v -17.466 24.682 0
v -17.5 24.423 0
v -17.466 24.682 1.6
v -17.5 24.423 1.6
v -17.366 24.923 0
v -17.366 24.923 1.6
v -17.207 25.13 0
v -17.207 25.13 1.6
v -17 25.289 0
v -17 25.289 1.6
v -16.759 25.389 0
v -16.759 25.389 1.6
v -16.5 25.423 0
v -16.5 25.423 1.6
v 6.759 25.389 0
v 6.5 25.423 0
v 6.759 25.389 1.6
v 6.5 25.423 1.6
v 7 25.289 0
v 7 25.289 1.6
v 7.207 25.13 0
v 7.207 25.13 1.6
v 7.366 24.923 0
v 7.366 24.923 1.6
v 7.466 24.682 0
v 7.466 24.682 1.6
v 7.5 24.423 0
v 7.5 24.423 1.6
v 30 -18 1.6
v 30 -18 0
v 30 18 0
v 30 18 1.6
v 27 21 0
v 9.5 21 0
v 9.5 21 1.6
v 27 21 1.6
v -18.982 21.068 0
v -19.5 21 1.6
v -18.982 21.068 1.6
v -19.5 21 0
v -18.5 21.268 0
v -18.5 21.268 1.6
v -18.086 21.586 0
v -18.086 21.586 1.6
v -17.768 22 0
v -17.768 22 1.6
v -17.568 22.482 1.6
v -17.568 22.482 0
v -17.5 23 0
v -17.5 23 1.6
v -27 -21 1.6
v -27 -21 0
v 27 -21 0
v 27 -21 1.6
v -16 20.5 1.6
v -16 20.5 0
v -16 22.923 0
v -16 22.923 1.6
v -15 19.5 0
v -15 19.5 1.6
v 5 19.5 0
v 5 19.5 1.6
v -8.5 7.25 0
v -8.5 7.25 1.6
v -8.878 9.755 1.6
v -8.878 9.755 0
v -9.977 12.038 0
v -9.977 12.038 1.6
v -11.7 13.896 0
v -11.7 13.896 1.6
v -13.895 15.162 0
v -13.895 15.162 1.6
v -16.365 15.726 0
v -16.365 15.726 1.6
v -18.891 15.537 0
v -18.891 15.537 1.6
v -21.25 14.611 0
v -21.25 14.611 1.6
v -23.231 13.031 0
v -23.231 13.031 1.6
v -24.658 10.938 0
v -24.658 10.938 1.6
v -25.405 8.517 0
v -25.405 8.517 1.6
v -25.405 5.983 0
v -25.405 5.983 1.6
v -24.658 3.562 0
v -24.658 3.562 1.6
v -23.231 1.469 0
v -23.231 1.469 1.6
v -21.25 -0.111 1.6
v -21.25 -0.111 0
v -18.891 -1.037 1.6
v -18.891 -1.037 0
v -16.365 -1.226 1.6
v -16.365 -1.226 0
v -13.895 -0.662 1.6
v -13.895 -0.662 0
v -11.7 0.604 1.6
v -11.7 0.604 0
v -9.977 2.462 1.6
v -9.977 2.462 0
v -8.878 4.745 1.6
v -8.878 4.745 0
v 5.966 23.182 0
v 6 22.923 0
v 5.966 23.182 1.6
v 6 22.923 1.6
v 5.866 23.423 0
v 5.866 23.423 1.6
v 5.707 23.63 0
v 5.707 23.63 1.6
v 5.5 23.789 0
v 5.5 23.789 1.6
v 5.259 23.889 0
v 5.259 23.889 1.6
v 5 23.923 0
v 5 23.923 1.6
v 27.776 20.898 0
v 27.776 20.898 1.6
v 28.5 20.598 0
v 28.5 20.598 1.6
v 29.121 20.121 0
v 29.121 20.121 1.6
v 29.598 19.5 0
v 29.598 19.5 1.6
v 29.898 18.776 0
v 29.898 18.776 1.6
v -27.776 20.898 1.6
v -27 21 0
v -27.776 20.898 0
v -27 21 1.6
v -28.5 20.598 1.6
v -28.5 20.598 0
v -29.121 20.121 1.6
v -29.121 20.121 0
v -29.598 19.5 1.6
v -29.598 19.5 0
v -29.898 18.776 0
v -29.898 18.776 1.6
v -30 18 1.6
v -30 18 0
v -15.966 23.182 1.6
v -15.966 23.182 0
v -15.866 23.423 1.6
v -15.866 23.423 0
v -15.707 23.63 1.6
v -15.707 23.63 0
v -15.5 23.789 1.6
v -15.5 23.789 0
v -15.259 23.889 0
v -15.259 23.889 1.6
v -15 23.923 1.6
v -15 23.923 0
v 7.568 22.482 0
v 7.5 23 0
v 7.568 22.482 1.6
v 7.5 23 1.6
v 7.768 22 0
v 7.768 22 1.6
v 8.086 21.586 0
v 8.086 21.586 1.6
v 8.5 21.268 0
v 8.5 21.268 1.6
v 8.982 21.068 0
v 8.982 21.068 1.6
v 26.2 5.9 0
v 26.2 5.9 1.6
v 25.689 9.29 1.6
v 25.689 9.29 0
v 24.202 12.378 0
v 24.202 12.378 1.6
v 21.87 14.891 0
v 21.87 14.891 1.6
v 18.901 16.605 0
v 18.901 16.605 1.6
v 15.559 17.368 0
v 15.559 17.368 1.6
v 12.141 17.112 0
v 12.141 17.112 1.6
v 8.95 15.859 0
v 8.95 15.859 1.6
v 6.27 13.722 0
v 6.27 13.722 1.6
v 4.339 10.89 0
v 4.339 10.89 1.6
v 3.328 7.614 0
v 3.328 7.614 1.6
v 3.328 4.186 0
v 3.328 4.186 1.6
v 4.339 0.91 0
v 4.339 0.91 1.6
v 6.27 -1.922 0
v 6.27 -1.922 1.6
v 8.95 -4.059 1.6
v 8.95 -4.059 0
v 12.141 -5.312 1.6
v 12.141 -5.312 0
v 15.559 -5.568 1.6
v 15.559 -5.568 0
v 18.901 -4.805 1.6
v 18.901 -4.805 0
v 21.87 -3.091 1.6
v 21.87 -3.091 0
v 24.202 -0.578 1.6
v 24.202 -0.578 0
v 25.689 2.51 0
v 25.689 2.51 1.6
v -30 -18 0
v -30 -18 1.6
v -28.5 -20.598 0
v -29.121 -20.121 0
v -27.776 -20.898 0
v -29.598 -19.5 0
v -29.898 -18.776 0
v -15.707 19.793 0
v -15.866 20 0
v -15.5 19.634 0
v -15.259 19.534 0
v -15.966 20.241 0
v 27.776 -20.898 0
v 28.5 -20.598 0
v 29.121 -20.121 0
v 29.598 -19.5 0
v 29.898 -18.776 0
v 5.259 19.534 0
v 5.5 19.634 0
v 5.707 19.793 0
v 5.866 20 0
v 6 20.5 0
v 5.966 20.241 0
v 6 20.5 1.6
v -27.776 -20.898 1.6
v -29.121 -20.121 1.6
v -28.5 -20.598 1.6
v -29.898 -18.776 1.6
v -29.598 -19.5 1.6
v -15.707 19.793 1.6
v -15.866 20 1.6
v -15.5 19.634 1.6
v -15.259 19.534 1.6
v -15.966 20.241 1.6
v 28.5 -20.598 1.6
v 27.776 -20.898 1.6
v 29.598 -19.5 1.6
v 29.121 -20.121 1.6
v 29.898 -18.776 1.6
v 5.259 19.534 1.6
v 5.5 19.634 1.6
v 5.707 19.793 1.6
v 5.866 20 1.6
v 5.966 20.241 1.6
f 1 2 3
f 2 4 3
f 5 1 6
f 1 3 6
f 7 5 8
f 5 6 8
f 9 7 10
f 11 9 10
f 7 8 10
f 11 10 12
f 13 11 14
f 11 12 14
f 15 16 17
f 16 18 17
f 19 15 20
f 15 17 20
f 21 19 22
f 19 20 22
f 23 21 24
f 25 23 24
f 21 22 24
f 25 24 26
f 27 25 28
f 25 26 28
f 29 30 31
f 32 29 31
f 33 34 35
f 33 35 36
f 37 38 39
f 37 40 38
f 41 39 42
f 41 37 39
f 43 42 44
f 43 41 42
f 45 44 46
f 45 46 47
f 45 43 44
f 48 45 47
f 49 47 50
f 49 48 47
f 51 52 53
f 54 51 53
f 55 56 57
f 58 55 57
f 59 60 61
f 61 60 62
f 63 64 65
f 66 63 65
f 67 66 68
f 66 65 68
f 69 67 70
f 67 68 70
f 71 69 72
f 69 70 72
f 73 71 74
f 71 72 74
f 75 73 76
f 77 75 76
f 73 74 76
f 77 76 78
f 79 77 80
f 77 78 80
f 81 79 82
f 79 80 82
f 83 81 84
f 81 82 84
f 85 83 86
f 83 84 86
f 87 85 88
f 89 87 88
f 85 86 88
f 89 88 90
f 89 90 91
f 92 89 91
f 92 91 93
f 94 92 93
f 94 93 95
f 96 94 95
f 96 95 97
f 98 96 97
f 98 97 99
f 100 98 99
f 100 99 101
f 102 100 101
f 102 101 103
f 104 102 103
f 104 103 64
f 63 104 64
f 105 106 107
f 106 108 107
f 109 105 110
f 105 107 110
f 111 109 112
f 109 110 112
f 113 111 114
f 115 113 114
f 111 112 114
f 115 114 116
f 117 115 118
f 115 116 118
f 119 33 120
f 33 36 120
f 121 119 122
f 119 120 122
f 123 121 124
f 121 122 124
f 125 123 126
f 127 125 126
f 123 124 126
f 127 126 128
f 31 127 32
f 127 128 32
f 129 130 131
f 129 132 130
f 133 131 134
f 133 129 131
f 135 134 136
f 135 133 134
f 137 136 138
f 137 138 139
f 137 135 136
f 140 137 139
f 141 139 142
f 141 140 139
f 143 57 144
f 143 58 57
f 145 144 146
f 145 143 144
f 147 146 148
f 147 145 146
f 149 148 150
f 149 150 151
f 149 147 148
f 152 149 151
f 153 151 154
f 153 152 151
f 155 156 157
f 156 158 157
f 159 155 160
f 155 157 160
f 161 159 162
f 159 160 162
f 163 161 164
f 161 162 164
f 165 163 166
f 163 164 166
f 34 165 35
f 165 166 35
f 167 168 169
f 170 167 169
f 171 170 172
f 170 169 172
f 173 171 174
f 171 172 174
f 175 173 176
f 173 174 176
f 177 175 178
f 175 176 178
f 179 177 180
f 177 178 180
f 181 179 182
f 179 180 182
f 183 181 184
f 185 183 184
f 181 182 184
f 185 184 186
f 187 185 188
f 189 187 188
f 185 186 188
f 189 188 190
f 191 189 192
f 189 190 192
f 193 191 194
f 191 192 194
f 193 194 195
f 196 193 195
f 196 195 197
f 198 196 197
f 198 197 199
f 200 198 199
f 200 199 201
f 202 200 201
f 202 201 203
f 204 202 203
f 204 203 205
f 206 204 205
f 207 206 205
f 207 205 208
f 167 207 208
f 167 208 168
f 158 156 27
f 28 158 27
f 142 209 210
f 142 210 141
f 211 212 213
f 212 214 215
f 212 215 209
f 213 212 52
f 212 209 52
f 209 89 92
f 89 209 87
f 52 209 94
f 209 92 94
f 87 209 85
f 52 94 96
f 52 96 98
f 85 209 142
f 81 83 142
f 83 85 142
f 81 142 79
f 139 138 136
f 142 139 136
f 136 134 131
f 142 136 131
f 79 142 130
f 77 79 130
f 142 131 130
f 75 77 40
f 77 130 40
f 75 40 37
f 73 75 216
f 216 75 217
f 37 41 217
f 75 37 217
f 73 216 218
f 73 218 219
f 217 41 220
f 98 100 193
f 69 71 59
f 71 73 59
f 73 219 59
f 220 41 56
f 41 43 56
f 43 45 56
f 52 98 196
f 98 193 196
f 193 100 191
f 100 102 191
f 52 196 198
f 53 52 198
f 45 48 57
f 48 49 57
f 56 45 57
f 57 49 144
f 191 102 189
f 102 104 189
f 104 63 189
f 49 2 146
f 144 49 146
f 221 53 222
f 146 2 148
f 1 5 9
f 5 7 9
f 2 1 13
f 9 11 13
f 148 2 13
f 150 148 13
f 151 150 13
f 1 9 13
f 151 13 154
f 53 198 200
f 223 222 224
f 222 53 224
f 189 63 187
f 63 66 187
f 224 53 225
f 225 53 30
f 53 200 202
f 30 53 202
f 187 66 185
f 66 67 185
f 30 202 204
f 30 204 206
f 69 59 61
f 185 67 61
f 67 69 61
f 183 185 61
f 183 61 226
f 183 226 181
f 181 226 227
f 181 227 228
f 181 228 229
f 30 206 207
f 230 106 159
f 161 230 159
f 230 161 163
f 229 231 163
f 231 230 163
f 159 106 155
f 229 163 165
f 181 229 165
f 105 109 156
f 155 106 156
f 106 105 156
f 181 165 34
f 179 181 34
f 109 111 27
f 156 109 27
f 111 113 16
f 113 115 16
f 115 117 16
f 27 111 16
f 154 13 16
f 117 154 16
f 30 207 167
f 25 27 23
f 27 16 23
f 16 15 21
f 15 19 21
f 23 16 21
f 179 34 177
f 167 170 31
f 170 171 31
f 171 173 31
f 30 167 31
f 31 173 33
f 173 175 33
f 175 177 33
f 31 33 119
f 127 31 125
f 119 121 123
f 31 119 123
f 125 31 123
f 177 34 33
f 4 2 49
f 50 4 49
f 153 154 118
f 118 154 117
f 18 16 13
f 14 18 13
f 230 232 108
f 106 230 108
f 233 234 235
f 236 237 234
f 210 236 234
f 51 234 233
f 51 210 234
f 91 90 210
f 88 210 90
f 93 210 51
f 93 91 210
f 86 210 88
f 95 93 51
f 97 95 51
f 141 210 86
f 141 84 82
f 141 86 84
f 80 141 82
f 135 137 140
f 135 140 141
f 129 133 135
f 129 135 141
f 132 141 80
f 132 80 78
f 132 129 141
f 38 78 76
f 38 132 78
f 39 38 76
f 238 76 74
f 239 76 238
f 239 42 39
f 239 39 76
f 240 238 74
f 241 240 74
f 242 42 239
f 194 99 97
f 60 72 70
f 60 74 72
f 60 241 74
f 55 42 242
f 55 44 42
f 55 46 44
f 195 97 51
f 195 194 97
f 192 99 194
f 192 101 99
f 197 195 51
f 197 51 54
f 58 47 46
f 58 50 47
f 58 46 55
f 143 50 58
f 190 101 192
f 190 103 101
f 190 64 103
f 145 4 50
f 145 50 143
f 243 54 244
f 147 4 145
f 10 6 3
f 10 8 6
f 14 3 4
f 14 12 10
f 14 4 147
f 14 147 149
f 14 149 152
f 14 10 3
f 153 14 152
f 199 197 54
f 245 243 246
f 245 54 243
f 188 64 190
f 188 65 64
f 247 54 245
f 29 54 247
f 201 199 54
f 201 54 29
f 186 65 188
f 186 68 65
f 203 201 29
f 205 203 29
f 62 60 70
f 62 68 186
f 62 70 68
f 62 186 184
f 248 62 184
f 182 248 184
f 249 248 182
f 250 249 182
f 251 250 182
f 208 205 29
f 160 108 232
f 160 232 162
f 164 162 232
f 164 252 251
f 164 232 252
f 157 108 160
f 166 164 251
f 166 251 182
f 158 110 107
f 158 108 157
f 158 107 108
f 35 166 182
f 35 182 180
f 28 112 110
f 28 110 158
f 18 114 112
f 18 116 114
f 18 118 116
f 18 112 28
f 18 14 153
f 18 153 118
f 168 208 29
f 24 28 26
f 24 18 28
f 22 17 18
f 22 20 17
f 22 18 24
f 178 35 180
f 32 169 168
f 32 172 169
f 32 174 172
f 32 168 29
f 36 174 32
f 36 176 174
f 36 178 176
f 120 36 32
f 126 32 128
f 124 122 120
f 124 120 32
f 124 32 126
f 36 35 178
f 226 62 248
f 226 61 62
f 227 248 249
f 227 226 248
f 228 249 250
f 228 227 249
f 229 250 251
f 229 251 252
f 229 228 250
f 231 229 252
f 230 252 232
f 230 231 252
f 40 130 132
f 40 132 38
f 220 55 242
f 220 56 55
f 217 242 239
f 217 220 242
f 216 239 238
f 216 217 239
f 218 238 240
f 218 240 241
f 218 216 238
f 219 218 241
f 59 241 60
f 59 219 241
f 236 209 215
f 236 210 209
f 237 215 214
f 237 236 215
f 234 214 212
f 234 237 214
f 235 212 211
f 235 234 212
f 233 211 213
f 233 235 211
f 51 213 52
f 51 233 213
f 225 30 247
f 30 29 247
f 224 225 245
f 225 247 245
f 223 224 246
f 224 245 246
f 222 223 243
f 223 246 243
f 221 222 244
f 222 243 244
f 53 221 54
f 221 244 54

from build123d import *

# Parameters (mm, degrees)
F0_W     = 60
F0_H     = 42
F1_DEPTH = 1.6
F2_R     = 11.5
F2_R_2   = 8.5
F3_DEPTH = 1.601
F5_DEPTH = 1.6
F6_R     = 3
F7_R     = 2
F8_W     = 22
F8_H     = 1.5
F9_DEPTH = 1.601
F10_R    = 1


with BuildPart() as f1:
    # F0 (on Top) → F1 (new body)
    with BuildSketch(Plane.XY):
        Rectangle(F0_W, F0_H)
    extrude(amount=F1_DEPTH)

    # F2 (on face) → F3 (cut, through all)
    with BuildSketch(Plane.XY.offset(1.6)):
        with Locations((14.7, 5.9)):
            Circle(F2_R)
        with Locations((-17, 7.25)):
            Circle(F2_R_2)
    extrude(amount=-F3_DEPTH, mode=Mode.SUBTRACT)

    # F4 (on Top) → F5 (join)
    with BuildSketch(Plane.XY):
        Polygon((-17.5, 25.4231041372), (-17.5, 20.9231041372), (-16, 20.9231041372), (-16, 23.9231041372), (6, 23.9231041372), (6, 20.9231041372), (7.5, 20.9231041372), (7.5, 25.4231041372), align=None)
    extrude(amount=F5_DEPTH)

    # F6
    f6_edges = [f1.edges().sort_by_distance(p)[0] for p in [
        (-30, 21, 0.8),
        (-30, -21, 0.8),
        (30, 21, 0.8),
        (30, -21, 0.8),
    ]]
    fillet(f6_edges, radius=F6_R)

    # F7
    f7_edges = [f1.edges().sort_by_distance(p)[0] for p in [
        (-17.5, 21, 0.8),
        (7.5, 21, 0.8),
    ]]
    fillet(f7_edges, radius=F7_R)

    # F8 (on face) → F9 (cut, through all)
    with BuildSketch(Plane.XY.offset(1.6)):
        with Locations((-5, 20.25)):
            Rectangle(F8_W, F8_H)
    extrude(amount=-F9_DEPTH, mode=Mode.SUBTRACT)

    # F10
    f10_edges = [f1.edges().sort_by_distance(p)[0] for p in [
        (-16, 23.923104, 0.8),
        (6, 23.923104, 0.8),
        (7.5, 25.423104, 0.8),
        (-17.5, 25.423104, 0.8),
        (-16, 19.5, 0.8),
        (6, 19.5, 0.8),
    ]]
    fillet(f10_edges, radius=F10_R)


solid = f1.part
